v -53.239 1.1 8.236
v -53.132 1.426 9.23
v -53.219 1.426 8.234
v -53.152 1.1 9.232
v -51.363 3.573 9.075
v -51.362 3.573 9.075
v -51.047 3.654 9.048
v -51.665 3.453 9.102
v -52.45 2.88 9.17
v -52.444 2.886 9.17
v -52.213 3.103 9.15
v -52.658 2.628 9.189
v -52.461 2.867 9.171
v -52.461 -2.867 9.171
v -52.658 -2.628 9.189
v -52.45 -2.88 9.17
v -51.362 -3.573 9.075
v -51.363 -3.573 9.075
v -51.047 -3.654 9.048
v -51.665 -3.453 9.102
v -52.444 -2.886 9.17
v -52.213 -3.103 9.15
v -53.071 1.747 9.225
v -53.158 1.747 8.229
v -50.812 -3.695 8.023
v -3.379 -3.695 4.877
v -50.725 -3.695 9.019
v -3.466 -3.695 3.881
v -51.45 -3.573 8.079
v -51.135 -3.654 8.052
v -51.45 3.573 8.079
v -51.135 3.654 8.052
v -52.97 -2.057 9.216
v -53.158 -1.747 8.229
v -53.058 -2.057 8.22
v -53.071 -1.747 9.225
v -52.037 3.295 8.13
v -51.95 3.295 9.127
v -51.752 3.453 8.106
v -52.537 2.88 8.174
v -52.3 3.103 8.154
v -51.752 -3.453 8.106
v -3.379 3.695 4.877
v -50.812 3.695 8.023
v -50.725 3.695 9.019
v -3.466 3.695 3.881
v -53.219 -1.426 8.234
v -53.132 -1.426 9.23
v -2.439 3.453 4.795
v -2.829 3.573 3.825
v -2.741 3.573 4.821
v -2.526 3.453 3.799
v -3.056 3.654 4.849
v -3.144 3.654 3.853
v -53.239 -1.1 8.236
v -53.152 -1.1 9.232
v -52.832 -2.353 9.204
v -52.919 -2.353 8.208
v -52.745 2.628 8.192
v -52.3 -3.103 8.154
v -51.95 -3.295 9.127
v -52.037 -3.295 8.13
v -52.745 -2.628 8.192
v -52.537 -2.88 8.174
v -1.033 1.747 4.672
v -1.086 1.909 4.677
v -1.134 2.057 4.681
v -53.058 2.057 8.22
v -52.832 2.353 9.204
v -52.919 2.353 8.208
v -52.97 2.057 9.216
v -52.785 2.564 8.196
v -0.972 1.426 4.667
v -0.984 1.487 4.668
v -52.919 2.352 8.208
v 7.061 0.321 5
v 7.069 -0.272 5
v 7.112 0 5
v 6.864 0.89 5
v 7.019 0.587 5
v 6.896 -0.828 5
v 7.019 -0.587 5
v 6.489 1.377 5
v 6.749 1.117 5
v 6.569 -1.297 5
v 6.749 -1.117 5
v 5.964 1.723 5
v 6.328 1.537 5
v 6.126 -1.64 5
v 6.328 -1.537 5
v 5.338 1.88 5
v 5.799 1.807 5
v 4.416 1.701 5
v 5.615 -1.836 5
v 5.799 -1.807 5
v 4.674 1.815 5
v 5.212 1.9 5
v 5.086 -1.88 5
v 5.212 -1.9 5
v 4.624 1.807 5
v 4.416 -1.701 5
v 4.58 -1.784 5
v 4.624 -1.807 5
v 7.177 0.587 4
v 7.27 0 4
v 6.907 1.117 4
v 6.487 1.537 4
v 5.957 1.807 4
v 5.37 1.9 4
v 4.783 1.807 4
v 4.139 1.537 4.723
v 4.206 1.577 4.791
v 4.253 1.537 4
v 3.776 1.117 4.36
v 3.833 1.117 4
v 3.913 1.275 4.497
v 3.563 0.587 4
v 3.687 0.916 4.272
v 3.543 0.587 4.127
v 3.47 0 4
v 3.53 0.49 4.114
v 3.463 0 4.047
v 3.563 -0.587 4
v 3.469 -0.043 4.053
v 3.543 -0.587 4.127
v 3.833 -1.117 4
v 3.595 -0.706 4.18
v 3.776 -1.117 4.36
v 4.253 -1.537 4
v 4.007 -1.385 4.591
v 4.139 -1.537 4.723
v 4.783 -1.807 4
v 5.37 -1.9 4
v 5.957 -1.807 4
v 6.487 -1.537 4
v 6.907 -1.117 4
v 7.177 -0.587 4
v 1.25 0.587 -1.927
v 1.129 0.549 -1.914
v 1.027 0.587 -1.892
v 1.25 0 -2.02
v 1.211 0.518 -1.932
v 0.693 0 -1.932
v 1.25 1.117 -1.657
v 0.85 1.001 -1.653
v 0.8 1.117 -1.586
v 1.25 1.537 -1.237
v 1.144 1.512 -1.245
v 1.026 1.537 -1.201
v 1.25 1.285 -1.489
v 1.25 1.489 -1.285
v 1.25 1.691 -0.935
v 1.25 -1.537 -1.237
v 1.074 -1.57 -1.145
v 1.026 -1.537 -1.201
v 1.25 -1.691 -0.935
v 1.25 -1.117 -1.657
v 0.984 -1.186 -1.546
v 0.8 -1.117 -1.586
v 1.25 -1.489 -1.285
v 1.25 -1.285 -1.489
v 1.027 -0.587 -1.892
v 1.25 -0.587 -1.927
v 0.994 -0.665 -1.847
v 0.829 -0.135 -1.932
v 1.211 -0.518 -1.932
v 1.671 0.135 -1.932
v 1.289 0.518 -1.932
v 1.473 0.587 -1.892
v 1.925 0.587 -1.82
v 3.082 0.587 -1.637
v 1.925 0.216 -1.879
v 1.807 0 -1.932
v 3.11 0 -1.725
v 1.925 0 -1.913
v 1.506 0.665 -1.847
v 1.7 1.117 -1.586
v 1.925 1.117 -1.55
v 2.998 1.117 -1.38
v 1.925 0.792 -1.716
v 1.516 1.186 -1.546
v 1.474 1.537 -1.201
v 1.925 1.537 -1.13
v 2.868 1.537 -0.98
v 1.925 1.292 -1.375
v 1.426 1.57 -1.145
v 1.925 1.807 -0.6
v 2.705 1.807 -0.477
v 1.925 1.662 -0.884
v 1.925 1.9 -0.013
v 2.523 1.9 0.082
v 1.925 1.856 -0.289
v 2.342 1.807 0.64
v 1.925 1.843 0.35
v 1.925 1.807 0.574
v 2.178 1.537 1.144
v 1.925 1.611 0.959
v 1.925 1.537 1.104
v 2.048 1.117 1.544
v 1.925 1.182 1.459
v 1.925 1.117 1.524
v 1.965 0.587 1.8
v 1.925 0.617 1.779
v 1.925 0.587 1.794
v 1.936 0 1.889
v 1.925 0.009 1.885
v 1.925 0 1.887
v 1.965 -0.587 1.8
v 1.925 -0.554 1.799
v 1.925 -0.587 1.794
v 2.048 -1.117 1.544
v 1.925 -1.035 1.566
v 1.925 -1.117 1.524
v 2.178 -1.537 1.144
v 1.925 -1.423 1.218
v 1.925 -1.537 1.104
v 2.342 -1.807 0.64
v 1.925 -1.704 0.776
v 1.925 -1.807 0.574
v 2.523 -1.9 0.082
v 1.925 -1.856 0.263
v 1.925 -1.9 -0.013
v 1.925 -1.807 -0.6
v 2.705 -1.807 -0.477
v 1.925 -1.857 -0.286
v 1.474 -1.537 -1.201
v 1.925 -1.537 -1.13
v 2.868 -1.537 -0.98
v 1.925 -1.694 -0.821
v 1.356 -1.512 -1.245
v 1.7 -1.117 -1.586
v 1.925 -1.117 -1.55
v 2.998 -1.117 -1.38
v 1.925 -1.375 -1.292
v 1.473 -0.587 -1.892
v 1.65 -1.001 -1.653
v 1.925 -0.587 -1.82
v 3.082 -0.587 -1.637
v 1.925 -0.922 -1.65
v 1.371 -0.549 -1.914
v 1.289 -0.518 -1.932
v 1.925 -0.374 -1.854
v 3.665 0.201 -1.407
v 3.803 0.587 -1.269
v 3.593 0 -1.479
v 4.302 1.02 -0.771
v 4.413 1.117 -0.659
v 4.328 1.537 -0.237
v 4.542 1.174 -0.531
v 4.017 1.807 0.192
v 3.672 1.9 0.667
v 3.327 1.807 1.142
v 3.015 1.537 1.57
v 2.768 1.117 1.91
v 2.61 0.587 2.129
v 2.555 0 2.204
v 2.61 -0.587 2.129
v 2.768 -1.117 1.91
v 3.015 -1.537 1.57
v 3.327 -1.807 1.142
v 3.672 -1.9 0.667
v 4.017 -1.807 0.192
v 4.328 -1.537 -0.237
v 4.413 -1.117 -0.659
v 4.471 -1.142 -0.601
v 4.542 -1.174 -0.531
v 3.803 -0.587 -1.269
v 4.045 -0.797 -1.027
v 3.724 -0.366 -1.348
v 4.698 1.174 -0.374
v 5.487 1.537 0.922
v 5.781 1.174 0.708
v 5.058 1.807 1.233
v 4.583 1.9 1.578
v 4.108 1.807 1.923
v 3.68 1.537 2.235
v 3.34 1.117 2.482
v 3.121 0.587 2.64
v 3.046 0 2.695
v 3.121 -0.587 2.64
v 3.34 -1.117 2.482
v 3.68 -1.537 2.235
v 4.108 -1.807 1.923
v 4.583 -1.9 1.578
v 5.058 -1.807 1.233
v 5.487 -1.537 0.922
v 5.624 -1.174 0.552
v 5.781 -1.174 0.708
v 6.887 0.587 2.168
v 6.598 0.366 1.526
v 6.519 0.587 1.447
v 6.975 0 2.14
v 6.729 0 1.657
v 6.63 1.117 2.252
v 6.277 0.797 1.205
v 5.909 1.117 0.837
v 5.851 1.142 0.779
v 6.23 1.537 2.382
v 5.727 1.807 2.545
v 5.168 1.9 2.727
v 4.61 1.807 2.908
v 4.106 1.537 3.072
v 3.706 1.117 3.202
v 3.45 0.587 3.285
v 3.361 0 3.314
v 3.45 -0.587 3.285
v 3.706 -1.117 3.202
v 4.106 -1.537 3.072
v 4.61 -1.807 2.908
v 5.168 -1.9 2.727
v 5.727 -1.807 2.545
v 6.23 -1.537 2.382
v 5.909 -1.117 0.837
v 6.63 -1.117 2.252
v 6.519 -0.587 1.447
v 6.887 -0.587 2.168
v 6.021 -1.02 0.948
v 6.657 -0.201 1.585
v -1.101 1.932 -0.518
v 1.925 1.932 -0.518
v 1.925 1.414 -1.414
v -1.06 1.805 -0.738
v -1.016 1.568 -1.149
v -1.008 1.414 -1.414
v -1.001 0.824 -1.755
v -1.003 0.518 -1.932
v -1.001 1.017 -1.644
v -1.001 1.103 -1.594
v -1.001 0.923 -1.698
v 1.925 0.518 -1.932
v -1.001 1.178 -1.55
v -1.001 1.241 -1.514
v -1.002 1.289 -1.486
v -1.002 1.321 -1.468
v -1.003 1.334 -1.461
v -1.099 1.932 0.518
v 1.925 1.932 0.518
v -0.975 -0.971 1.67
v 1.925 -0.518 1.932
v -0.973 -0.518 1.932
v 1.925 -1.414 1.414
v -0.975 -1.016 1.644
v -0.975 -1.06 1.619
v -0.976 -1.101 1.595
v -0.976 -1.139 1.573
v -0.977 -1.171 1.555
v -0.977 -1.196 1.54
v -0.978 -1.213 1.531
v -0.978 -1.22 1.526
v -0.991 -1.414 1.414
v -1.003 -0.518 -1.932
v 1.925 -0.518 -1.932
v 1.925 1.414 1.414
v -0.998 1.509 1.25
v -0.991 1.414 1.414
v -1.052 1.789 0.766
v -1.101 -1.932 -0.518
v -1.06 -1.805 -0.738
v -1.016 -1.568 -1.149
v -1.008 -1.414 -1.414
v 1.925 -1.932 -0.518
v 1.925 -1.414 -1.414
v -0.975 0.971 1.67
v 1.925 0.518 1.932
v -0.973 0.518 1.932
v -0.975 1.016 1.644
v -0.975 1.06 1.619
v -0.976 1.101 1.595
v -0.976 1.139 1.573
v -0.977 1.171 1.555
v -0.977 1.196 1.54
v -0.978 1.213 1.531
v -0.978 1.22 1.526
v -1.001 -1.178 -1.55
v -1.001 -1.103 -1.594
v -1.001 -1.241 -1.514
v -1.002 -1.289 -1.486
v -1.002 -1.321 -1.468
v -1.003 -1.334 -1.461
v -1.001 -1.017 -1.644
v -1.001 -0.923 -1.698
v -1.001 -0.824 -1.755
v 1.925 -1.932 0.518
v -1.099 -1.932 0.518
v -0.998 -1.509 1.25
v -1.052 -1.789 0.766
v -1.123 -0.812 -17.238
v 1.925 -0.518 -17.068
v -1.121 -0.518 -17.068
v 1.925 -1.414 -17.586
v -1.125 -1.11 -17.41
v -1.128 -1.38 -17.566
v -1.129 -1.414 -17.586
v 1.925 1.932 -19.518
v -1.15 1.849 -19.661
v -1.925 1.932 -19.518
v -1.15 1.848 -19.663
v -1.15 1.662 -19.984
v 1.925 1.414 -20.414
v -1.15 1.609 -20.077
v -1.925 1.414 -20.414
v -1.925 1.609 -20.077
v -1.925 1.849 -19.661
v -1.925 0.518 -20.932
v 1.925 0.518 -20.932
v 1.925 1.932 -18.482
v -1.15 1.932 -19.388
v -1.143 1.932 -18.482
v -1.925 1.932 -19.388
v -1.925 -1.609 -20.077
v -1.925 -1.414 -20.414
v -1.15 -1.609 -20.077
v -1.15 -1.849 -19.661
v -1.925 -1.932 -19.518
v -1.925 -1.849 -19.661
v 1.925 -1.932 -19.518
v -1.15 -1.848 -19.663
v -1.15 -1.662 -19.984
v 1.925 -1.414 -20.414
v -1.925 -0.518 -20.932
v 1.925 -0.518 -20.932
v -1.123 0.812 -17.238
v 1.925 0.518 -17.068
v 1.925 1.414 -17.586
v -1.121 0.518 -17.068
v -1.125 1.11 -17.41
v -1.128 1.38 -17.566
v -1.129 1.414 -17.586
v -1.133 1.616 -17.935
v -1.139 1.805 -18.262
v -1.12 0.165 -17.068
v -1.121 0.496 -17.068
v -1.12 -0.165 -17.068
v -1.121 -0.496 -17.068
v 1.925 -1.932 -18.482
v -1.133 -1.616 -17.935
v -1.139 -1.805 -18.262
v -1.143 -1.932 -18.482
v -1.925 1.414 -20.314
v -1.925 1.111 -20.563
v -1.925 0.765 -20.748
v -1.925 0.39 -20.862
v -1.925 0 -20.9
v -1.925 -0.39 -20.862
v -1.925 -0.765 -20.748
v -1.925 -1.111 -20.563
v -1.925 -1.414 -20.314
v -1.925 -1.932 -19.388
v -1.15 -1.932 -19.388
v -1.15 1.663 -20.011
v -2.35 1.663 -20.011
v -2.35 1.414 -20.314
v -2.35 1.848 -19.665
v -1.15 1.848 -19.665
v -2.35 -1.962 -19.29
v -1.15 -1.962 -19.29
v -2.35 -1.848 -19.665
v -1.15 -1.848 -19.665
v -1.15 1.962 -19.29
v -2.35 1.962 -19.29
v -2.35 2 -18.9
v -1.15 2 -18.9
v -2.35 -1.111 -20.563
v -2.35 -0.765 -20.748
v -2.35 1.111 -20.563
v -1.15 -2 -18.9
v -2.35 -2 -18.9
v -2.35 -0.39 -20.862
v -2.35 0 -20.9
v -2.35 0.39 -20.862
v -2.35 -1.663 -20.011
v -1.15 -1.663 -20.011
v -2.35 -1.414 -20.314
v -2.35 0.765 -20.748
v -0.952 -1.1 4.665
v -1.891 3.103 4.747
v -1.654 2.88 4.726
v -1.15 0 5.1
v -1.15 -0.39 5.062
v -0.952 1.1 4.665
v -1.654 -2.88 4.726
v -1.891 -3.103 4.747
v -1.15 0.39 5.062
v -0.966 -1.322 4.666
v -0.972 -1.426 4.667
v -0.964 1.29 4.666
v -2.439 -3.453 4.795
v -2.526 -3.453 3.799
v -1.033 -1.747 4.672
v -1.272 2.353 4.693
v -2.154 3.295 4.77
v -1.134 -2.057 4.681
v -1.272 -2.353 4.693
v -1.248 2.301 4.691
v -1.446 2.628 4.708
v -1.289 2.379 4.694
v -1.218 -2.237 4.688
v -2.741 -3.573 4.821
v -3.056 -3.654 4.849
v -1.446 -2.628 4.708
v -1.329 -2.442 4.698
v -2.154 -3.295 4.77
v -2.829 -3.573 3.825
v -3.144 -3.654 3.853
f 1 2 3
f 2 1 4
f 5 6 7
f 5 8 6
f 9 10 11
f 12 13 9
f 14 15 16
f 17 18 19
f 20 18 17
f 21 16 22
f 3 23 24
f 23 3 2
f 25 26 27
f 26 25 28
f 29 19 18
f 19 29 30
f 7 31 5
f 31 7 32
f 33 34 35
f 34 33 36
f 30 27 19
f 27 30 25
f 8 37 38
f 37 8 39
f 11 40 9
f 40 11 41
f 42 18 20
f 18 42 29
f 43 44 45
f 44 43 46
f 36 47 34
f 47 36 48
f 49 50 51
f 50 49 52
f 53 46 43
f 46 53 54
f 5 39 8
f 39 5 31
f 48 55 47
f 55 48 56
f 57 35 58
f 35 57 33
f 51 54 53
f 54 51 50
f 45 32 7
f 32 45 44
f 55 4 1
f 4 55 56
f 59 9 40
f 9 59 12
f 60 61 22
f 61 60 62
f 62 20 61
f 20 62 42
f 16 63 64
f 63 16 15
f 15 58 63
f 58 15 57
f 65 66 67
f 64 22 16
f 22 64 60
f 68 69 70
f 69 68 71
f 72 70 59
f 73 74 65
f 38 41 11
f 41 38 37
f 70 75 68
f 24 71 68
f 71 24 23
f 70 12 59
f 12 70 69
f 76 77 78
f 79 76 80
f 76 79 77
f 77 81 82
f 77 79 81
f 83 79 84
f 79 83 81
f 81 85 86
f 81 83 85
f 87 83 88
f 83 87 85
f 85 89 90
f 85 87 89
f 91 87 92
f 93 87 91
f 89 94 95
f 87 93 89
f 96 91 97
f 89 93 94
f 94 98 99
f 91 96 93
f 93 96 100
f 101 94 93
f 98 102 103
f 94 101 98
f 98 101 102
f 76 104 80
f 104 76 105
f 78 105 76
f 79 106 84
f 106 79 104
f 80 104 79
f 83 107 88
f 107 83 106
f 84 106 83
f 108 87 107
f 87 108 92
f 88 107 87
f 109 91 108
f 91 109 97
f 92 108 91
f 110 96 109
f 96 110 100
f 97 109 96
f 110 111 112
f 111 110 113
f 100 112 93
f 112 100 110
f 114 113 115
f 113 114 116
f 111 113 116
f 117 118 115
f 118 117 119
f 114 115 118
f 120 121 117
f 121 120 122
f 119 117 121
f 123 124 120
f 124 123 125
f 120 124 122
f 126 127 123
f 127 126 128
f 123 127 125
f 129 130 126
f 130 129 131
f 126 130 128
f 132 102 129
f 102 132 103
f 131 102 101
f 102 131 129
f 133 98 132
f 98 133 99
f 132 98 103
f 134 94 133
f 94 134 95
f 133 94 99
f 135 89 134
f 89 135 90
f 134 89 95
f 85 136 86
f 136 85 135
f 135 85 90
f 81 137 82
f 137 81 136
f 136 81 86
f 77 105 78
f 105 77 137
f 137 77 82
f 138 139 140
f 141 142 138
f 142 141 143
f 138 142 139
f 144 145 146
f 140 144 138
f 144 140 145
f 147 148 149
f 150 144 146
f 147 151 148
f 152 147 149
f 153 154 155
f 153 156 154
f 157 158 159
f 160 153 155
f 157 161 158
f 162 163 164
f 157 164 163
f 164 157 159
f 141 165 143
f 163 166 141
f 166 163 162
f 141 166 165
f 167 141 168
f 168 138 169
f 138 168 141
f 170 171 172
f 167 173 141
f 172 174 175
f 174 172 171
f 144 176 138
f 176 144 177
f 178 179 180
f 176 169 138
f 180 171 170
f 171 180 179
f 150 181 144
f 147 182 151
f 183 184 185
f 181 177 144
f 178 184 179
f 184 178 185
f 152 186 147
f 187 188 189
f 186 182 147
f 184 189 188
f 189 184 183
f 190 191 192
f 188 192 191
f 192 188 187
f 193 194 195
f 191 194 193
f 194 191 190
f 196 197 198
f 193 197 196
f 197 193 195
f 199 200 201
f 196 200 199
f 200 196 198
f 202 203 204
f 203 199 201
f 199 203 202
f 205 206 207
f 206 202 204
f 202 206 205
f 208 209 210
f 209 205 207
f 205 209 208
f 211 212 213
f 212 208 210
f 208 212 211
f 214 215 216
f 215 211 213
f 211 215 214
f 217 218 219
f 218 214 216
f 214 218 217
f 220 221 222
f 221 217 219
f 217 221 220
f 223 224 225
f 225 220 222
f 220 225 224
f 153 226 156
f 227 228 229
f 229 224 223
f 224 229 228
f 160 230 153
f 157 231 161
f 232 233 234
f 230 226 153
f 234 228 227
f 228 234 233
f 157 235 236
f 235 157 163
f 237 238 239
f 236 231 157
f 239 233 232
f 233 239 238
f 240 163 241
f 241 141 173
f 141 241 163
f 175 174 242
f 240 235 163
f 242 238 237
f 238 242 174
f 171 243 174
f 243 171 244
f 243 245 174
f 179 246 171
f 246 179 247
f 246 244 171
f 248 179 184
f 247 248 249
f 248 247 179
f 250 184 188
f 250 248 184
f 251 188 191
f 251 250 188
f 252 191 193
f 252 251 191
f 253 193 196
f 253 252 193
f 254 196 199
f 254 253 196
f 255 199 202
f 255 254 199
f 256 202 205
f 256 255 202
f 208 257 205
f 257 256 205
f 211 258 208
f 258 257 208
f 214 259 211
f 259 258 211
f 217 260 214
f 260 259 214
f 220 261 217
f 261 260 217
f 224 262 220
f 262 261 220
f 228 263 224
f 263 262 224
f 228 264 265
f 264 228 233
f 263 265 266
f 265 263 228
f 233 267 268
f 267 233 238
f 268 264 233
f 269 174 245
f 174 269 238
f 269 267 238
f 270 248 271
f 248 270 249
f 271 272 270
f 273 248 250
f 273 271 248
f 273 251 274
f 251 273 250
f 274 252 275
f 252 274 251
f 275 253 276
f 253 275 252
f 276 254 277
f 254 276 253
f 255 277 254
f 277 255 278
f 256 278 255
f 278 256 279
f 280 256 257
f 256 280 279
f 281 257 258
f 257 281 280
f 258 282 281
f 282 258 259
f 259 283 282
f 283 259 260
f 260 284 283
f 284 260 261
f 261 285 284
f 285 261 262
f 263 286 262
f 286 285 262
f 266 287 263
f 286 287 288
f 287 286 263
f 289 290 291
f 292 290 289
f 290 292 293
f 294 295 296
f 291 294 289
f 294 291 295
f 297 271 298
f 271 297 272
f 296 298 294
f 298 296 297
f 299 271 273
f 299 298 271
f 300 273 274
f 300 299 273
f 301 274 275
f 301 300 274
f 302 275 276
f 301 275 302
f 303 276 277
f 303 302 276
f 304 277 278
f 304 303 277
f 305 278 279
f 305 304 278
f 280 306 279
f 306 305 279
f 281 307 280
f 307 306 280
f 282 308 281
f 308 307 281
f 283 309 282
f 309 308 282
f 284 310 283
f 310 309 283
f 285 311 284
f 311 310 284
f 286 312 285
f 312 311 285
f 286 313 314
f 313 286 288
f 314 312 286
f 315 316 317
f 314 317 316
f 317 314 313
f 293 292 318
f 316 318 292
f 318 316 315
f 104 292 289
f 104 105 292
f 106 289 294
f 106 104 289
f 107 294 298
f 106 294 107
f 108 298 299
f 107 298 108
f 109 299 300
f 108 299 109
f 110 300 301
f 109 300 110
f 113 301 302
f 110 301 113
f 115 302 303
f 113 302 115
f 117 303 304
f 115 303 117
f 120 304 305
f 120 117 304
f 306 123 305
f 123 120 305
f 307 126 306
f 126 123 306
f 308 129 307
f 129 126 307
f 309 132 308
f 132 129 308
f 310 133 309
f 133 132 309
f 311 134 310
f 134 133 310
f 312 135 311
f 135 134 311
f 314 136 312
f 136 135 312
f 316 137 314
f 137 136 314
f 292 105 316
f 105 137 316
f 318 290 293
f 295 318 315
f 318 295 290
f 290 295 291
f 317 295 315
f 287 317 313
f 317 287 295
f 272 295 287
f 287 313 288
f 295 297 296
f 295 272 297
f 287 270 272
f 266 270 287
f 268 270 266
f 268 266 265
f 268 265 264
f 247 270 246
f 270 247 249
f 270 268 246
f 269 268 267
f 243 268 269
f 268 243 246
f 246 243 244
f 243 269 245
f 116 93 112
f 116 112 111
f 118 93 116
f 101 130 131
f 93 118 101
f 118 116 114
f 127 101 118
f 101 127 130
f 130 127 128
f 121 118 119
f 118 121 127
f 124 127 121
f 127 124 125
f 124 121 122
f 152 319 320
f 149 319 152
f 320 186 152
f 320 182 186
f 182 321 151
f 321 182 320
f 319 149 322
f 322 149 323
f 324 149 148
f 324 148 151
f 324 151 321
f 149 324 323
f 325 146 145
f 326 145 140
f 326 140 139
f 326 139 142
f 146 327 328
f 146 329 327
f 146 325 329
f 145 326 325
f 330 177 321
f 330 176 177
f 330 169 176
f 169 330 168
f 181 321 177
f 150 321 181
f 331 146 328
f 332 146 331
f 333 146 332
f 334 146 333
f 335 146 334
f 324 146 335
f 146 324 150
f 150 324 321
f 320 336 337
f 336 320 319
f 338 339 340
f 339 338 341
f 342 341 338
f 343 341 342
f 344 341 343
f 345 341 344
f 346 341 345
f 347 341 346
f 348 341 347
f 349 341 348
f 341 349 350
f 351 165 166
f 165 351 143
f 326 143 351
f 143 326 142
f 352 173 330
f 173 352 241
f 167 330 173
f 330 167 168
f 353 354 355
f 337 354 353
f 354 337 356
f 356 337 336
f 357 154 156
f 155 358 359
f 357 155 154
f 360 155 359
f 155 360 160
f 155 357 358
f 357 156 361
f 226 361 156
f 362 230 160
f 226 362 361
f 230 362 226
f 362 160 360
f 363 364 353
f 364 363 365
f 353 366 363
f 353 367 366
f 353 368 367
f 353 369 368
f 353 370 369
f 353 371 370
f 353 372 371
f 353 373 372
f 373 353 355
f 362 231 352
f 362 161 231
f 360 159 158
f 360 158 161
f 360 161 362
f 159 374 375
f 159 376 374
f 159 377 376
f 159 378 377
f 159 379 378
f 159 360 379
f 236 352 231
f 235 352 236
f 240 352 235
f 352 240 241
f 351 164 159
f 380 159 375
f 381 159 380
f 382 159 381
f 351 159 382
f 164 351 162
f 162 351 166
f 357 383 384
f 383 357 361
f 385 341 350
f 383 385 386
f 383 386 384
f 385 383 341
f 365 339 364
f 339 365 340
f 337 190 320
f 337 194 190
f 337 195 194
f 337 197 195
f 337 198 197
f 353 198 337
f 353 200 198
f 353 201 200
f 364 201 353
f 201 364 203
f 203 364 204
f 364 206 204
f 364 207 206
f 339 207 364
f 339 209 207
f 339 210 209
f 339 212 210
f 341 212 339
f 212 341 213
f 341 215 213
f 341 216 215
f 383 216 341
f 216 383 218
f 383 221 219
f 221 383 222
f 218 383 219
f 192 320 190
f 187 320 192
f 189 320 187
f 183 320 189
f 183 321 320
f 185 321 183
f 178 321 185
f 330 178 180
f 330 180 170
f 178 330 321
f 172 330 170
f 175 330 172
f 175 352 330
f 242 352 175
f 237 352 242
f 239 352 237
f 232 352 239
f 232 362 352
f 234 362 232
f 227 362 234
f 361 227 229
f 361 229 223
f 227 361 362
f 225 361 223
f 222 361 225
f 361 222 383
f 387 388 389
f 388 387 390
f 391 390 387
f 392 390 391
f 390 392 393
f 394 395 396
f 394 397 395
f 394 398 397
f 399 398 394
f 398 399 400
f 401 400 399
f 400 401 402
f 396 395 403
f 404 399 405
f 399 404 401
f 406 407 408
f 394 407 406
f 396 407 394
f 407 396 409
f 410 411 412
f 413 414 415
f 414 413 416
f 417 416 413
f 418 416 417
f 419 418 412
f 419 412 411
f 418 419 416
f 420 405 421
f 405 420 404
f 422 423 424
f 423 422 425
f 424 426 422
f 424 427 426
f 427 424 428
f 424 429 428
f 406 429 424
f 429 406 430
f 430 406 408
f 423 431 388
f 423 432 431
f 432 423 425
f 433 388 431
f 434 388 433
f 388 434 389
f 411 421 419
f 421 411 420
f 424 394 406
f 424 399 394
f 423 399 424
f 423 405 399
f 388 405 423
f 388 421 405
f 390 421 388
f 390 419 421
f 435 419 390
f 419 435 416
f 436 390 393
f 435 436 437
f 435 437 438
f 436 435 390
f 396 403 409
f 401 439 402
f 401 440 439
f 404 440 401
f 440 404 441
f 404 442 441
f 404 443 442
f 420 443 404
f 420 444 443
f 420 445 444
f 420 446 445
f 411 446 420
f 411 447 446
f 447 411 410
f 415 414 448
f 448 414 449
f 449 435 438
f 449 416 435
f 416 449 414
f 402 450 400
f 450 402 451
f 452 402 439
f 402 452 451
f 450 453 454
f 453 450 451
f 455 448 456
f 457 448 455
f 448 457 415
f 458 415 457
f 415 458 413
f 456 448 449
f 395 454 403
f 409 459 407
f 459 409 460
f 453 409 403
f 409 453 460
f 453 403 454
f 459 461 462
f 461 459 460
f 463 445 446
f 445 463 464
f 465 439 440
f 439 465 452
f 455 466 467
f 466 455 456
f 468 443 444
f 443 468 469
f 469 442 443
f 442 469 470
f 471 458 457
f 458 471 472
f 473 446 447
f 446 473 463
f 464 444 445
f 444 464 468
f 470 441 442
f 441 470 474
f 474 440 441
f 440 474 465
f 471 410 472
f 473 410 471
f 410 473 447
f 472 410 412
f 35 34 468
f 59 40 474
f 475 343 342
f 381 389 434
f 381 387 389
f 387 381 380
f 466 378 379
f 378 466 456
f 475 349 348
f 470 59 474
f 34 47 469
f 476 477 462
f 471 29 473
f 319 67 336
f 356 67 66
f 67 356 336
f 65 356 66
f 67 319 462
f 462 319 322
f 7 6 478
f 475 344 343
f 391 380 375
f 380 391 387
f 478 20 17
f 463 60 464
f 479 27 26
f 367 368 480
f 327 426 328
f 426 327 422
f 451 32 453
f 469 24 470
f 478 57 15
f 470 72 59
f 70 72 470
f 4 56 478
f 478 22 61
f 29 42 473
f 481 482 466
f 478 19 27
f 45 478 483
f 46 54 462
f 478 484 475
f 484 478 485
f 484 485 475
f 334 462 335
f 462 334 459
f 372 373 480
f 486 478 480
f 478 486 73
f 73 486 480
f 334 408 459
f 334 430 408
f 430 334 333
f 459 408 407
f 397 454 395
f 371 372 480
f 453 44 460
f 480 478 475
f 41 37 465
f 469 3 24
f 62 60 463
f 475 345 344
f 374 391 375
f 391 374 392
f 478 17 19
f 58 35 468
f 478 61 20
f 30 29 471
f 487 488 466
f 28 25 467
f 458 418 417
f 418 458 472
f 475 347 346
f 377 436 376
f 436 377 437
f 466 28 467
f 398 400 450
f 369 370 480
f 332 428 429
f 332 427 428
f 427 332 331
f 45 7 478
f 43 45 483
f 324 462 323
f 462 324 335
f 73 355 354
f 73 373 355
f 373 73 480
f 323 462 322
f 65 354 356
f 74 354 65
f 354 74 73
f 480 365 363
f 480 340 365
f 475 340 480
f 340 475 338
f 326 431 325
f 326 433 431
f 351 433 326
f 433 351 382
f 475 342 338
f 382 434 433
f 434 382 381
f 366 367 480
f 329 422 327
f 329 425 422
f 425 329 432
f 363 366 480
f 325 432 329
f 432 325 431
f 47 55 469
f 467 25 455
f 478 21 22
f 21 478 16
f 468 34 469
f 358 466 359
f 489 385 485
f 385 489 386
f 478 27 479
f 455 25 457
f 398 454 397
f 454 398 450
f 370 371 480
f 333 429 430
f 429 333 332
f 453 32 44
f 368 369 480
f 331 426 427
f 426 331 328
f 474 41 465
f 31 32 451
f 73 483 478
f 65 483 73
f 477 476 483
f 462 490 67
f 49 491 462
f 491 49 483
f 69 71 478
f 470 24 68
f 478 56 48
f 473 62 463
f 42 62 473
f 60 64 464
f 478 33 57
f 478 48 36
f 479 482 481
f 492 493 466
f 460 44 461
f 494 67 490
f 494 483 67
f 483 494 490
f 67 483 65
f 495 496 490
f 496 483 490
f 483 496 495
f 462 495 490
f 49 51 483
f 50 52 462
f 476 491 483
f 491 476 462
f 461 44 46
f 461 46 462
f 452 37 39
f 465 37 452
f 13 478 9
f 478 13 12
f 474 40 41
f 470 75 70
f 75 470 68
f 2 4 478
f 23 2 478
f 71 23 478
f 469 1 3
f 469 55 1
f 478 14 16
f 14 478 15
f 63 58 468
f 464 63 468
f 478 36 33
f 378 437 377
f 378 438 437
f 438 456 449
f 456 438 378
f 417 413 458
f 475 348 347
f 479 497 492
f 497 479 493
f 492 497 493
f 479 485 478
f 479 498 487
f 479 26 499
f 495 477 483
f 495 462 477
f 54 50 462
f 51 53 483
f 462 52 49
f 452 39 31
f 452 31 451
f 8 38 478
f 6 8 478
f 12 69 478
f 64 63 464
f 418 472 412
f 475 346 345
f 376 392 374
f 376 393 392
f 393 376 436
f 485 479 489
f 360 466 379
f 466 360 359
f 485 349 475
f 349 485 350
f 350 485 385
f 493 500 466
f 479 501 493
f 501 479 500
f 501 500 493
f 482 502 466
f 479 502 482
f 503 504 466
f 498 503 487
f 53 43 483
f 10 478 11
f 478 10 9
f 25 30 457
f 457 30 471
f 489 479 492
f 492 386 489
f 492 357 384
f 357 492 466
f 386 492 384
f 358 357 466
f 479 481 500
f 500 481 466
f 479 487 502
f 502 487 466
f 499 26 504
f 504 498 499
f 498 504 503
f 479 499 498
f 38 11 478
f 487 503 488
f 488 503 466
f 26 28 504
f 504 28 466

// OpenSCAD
// PEGSTR - Pegboard Wizard
// Design by Marius Gheorghescu, November 2014
// Update log:
// November 9th 2014
//		- first coomplete version. Angled holders are often odd/incorrect.
// November 15th 2014
//		- minor tweaks to increase rendering speed. added logo. 
// November 28th 2014
//		- bug fixes
// June 14th 2016
//		- added holder_x_size_space and  holder_y_size_space
//		- handling different hole_size

// preview[view:north, tilt:bottom diagonal]

// width of the orifice
holder_x_size = 5;

// x space between orifice
holder_x_size_space =2;

// depth of the orifice
holder_y_size = 50;

// y space between orifice
holder_y_size_space = 0;

// height of the holder
holder_height = 10;

// how thick are the walls. Hint: 6*extrusion width produces the best results.
wall_thickness = 1.2;

// how many times to repeat the holder on X axis
holder_x_count = 1;

// how many times to repeat the holder on Y axis
holder_y_count = 1;

// orifice corner radius (roundness). Needs to be less than min(x,y)/2.
corner_radius = 2.5;

// Use values less than 1.0 to make the bottom of the holder narrow
taper_ratio = 0;


/* [Advanced] */

// offset from the peg board, typically 0 unless you have an object that needs clearance
holder_offset = 0;

// what ratio of the holders bottom is reinforced to the plate [0.0-1.0]
strength_factor = 1;

// for bins: what ratio of wall thickness to use for closing the bottom
closed_bottom = 9;

// what percentage cu cut in the front (example to slip in a cable or make the tool snap from the side)
holder_cutout_side = 0.0;

// set an angle for the holder to prevent object from sliding or to view it better from the top
holder_angle = 5;

// hole spacing
hole_spacing = 19;
// hole size
hole_size = 4;
// board thickness
board_thickness = 2.5;


/* [Hidden] */

// what is the $fn parameter
holder_sides = max(50, min(20, holder_x_size*2));




holder_total_x = wall_thickness + holder_x_count*(wall_thickness+holder_x_size)+(holder_x_count-1)*holder_x_size_space;
holder_total_y = wall_thickness + holder_y_count*(wall_thickness+holder_y_size)+(holder_y_count-1)*holder_y_size_space;
holder_total_z = round(holder_height/hole_spacing)*hole_spacing;
holder_roundness = min(corner_radius, holder_x_size/2, holder_y_size/2); 


// what is the $fn parameter for holders
fn = 32;

epsilon = 0.1;

clip_height = 2*hole_size + 2;
$fn = fn;

module round_rect_ex(x1, y1, x2, y2, z, r1, r2)
{
	$fn=holder_sides;
	brim = z/10;

	//rotate([0,0,(holder_sides==6)?30:((holder_sides==4)?45:0)])
	hull() {
        translate([-x1/2 + r1, y1/2 - r1, z/2-brim/2])
            cylinder(r=r1, h=brim,center=true);
        translate([x1/2 - r1, y1/2 - r1, z/2-brim/2])
            cylinder(r=r1, h=brim,center=true);
        translate([-x1/2 + r1, -y1/2 + r1, z/2-brim/2])
            cylinder(r=r1, h=brim,center=true);
        translate([x1/2 - r1, -y1/2 + r1, z/2-brim/2])
            cylinder(r=r1, h=brim,center=true);

        translate([-x2/2 + r2, y2/2 - r2, -z/2+brim/2])
            cylinder(r=r2, h=brim,center=true);
        translate([x2/2 - r2, y2/2 - r2, -z/2+brim/2])
            cylinder(r=r2, h=brim,center=true);
        translate([-x2/2 + r2, -y2/2 + r2, -z/2+brim/2])
            cylinder(r=r2, h=brim,center=true);
        translate([x2/2 - r2, -y2/2 + r2, -z/2+brim/2])
            cylinder(r=r2, h=brim,center=true);

    }
}

module pin(clip)
{
	rotate([0,0,15])
	cylinder(r=hole_size/2, h=board_thickness*1.5+epsilon, center=true, $fn=12);

	if (clip) {
		//
		rotate([0,0,90])
		intersection() {
			translate([0, 0, hole_size-epsilon])
				cube([hole_size+2*epsilon, clip_height, 2*hole_size], center=true);

			// [-hole_size/2 - 1.95,0, board_thickness/2]
			translate([0, hole_size/2 + 2, board_thickness/2]) 
				rotate([0, 90, 0])
				rotate_extrude(convexity = 5, $fn=20)
				translate([0.44*hole_size+2.36, 0, 0])
				 circle(r = (hole_size*0.95)/2); 
			
			translate([0, hole_size/2 + 2 - 1.6, board_thickness/2]) 
				rotate([45,0,0])
				translate([0, -0, hole_size*0.6])
					cube([hole_size+2*epsilon, 3*hole_size, hole_size], center=true);
		}
	}
}

module pinboard_clips() 
{
	rotate([0,90,0])
	for(i=[0:round(holder_total_x/hole_spacing)]) {
		for(j=[0:max(strength_factor, round(holder_height/hole_spacing))]) {

			translate([
				j*hole_spacing, 
				-hole_spacing*(round(holder_total_x/hole_spacing)/2) + i*hole_spacing, 
				0])
					pin(j==0);
		}
	}
}

module pinboard(clips)
{
	rotate([0,90,0])
	translate([-epsilon, 0, -wall_thickness - board_thickness/2 + epsilon])
	hull() {
		translate([-clip_height/2 + hole_size/2, 
			-hole_spacing*(round(holder_total_x/hole_spacing)/2),0])
			cylinder(r=hole_size/2, h=wall_thickness);

		translate([-clip_height/2 + hole_size/2, 
			hole_spacing*(round(holder_total_x/hole_spacing)/2),0])
			cylinder(r=hole_size/2,  h=wall_thickness);

		translate([max(strength_factor, round(holder_height/hole_spacing))*hole_spacing,
			-hole_spacing*(round(holder_total_x/hole_spacing)/2),0])
			cylinder(r=hole_size/2, h=wall_thickness);

		translate([max(strength_factor, round(holder_height/hole_spacing))*hole_spacing,
			hole_spacing*(round(holder_total_x/hole_spacing)/2),0])
			cylinder(r=hole_size/2,  h=wall_thickness);

	}
}

module holder(negative)
{
	for(x=[1:holder_x_count]){
		for(y=[1:holder_y_count]) 
/*		render(convexity=2)*/ {
			translate([
				-holder_total_y /*- (holder_y_size+wall_thickness)/2*/ + y*(holder_y_size+wall_thickness+holder_y_size_space) + wall_thickness,

				-holder_total_x/2 + (holder_x_size+wall_thickness)/2 + (x-1)*(holder_x_size+wall_thickness+holder_x_size_space) + wall_thickness/2,
				 0])			
	{
		rotate([0, holder_angle, 0])
		translate([
			-wall_thickness*abs(sin(holder_angle))-0*abs((holder_y_size/2)*sin(holder_angle))-holder_offset-holder_y_size_space-(holder_y_size + 2*wall_thickness)/2 - board_thickness/2,
			0,
			-(holder_height/2)*sin(holder_angle) - holder_height/2 + clip_height/2
		])
		difference() {
			if (!negative)
                // external piece
				round_rect_ex(
					(holder_y_size + 2*wall_thickness), 
					holder_x_size + 2*wall_thickness, 
					(holder_y_size + 2*wall_thickness)*taper_ratio, 
					(holder_x_size + 2*wall_thickness)*taper_ratio, 
					holder_height, 
					holder_roundness + epsilon, 
					holder_roundness*taper_ratio + epsilon);

				translate([0,0,closed_bottom*wall_thickness])

				if (negative>1) {
					round_rect_ex(
						holder_y_size*taper_ratio, 
						holder_x_size*taper_ratio, 
						holder_y_size*taper_ratio, 
						holder_x_size*taper_ratio, 
						3*max(holder_height, hole_spacing),
						holder_roundness*taper_ratio + epsilon, 
						holder_roundness*taper_ratio + epsilon);
				} else {
                    //internal holes
					round_rect_ex( 
						holder_y_size, 
						holder_x_size, 
						holder_y_size*taper_ratio, 
						holder_x_size*taper_ratio, 
						holder_height+2*epsilon,
						holder_roundness + epsilon, 
						holder_roundness*taper_ratio + epsilon);
				}

			if (!negative)
				if (holder_cutout_side > 0) {

				if (negative>1) {
					hull() {
						scale([1.0, holder_cutout_side, 1.0])
		 					round_rect_ex(
							holder_y_size*taper_ratio, 
							holder_x_size*taper_ratio, 
							holder_y_size*taper_ratio, 
							holder_x_size*taper_ratio, 
							3*max(holder_height, hole_spacing),
							holder_roundness*taper_ratio + epsilon, 
							holder_roundness*taper_ratio + epsilon);
		
						translate([0-(holder_y_size + 2*wall_thickness), 0,0])
						scale([1.0, holder_cutout_side, 1.0])
		 					round_rect_ex(
							holder_y_size*taper_ratio, 
							holder_x_size*taper_ratio, 
							holder_y_size*taper_ratio, 
							holder_x_size*taper_ratio, 
							3*max(holder_height, hole_spacing),
							holder_roundness*taper_ratio + epsilon, 
							holder_roundness*taper_ratio + epsilon);
					}
				} else {
					hull() {
						scale([1.0, holder_cutout_side, 1.0])
		 					round_rect_ex(
							holder_y_size, 
							holder_x_size, 
							holder_y_size*taper_ratio, 
							holder_x_size*taper_ratio, 
							holder_height+2*epsilon,
							holder_roundness + epsilon, 
							holder_roundness*taper_ratio + epsilon);
		
						translate([0-(holder_y_size + 2*wall_thickness), 0,0])
						scale([1.0, holder_cutout_side, 1.0])
		 					round_rect_ex(
							holder_y_size, 
							holder_x_size, 
							holder_y_size*taper_ratio, 
							holder_x_size*taper_ratio, 
							holder_height+2*epsilon,
							holder_roundness + epsilon, 
							holder_roundness*taper_ratio + epsilon);
						}
					}

				}
			}
		} // positioning
	} // for y
	} // for X
}


module pegstr() 
{
	difference() {
		union() {

			pinboard();


			difference() {
				hull() {
					pinboard();
	
					intersection() {
						translate([-holder_offset - (strength_factor-0.5)*holder_total_y - wall_thickness/4,0,0])
						cube([
							holder_total_y + 2*wall_thickness, 
							holder_total_x + wall_thickness, 
							2*holder_height
						], center=true);
	
						holder(0);
	
					}	
				}

				if (closed_bottom*wall_thickness < epsilon) {
						holder(2);
				}

			}

			color([0.7,0,0])
			difference() {
				holder(0);
				holder(2);
			}

			color([1,0,0])
				pinboard_clips();
		}
	
		holder(1);
	}
}


pegstr();
